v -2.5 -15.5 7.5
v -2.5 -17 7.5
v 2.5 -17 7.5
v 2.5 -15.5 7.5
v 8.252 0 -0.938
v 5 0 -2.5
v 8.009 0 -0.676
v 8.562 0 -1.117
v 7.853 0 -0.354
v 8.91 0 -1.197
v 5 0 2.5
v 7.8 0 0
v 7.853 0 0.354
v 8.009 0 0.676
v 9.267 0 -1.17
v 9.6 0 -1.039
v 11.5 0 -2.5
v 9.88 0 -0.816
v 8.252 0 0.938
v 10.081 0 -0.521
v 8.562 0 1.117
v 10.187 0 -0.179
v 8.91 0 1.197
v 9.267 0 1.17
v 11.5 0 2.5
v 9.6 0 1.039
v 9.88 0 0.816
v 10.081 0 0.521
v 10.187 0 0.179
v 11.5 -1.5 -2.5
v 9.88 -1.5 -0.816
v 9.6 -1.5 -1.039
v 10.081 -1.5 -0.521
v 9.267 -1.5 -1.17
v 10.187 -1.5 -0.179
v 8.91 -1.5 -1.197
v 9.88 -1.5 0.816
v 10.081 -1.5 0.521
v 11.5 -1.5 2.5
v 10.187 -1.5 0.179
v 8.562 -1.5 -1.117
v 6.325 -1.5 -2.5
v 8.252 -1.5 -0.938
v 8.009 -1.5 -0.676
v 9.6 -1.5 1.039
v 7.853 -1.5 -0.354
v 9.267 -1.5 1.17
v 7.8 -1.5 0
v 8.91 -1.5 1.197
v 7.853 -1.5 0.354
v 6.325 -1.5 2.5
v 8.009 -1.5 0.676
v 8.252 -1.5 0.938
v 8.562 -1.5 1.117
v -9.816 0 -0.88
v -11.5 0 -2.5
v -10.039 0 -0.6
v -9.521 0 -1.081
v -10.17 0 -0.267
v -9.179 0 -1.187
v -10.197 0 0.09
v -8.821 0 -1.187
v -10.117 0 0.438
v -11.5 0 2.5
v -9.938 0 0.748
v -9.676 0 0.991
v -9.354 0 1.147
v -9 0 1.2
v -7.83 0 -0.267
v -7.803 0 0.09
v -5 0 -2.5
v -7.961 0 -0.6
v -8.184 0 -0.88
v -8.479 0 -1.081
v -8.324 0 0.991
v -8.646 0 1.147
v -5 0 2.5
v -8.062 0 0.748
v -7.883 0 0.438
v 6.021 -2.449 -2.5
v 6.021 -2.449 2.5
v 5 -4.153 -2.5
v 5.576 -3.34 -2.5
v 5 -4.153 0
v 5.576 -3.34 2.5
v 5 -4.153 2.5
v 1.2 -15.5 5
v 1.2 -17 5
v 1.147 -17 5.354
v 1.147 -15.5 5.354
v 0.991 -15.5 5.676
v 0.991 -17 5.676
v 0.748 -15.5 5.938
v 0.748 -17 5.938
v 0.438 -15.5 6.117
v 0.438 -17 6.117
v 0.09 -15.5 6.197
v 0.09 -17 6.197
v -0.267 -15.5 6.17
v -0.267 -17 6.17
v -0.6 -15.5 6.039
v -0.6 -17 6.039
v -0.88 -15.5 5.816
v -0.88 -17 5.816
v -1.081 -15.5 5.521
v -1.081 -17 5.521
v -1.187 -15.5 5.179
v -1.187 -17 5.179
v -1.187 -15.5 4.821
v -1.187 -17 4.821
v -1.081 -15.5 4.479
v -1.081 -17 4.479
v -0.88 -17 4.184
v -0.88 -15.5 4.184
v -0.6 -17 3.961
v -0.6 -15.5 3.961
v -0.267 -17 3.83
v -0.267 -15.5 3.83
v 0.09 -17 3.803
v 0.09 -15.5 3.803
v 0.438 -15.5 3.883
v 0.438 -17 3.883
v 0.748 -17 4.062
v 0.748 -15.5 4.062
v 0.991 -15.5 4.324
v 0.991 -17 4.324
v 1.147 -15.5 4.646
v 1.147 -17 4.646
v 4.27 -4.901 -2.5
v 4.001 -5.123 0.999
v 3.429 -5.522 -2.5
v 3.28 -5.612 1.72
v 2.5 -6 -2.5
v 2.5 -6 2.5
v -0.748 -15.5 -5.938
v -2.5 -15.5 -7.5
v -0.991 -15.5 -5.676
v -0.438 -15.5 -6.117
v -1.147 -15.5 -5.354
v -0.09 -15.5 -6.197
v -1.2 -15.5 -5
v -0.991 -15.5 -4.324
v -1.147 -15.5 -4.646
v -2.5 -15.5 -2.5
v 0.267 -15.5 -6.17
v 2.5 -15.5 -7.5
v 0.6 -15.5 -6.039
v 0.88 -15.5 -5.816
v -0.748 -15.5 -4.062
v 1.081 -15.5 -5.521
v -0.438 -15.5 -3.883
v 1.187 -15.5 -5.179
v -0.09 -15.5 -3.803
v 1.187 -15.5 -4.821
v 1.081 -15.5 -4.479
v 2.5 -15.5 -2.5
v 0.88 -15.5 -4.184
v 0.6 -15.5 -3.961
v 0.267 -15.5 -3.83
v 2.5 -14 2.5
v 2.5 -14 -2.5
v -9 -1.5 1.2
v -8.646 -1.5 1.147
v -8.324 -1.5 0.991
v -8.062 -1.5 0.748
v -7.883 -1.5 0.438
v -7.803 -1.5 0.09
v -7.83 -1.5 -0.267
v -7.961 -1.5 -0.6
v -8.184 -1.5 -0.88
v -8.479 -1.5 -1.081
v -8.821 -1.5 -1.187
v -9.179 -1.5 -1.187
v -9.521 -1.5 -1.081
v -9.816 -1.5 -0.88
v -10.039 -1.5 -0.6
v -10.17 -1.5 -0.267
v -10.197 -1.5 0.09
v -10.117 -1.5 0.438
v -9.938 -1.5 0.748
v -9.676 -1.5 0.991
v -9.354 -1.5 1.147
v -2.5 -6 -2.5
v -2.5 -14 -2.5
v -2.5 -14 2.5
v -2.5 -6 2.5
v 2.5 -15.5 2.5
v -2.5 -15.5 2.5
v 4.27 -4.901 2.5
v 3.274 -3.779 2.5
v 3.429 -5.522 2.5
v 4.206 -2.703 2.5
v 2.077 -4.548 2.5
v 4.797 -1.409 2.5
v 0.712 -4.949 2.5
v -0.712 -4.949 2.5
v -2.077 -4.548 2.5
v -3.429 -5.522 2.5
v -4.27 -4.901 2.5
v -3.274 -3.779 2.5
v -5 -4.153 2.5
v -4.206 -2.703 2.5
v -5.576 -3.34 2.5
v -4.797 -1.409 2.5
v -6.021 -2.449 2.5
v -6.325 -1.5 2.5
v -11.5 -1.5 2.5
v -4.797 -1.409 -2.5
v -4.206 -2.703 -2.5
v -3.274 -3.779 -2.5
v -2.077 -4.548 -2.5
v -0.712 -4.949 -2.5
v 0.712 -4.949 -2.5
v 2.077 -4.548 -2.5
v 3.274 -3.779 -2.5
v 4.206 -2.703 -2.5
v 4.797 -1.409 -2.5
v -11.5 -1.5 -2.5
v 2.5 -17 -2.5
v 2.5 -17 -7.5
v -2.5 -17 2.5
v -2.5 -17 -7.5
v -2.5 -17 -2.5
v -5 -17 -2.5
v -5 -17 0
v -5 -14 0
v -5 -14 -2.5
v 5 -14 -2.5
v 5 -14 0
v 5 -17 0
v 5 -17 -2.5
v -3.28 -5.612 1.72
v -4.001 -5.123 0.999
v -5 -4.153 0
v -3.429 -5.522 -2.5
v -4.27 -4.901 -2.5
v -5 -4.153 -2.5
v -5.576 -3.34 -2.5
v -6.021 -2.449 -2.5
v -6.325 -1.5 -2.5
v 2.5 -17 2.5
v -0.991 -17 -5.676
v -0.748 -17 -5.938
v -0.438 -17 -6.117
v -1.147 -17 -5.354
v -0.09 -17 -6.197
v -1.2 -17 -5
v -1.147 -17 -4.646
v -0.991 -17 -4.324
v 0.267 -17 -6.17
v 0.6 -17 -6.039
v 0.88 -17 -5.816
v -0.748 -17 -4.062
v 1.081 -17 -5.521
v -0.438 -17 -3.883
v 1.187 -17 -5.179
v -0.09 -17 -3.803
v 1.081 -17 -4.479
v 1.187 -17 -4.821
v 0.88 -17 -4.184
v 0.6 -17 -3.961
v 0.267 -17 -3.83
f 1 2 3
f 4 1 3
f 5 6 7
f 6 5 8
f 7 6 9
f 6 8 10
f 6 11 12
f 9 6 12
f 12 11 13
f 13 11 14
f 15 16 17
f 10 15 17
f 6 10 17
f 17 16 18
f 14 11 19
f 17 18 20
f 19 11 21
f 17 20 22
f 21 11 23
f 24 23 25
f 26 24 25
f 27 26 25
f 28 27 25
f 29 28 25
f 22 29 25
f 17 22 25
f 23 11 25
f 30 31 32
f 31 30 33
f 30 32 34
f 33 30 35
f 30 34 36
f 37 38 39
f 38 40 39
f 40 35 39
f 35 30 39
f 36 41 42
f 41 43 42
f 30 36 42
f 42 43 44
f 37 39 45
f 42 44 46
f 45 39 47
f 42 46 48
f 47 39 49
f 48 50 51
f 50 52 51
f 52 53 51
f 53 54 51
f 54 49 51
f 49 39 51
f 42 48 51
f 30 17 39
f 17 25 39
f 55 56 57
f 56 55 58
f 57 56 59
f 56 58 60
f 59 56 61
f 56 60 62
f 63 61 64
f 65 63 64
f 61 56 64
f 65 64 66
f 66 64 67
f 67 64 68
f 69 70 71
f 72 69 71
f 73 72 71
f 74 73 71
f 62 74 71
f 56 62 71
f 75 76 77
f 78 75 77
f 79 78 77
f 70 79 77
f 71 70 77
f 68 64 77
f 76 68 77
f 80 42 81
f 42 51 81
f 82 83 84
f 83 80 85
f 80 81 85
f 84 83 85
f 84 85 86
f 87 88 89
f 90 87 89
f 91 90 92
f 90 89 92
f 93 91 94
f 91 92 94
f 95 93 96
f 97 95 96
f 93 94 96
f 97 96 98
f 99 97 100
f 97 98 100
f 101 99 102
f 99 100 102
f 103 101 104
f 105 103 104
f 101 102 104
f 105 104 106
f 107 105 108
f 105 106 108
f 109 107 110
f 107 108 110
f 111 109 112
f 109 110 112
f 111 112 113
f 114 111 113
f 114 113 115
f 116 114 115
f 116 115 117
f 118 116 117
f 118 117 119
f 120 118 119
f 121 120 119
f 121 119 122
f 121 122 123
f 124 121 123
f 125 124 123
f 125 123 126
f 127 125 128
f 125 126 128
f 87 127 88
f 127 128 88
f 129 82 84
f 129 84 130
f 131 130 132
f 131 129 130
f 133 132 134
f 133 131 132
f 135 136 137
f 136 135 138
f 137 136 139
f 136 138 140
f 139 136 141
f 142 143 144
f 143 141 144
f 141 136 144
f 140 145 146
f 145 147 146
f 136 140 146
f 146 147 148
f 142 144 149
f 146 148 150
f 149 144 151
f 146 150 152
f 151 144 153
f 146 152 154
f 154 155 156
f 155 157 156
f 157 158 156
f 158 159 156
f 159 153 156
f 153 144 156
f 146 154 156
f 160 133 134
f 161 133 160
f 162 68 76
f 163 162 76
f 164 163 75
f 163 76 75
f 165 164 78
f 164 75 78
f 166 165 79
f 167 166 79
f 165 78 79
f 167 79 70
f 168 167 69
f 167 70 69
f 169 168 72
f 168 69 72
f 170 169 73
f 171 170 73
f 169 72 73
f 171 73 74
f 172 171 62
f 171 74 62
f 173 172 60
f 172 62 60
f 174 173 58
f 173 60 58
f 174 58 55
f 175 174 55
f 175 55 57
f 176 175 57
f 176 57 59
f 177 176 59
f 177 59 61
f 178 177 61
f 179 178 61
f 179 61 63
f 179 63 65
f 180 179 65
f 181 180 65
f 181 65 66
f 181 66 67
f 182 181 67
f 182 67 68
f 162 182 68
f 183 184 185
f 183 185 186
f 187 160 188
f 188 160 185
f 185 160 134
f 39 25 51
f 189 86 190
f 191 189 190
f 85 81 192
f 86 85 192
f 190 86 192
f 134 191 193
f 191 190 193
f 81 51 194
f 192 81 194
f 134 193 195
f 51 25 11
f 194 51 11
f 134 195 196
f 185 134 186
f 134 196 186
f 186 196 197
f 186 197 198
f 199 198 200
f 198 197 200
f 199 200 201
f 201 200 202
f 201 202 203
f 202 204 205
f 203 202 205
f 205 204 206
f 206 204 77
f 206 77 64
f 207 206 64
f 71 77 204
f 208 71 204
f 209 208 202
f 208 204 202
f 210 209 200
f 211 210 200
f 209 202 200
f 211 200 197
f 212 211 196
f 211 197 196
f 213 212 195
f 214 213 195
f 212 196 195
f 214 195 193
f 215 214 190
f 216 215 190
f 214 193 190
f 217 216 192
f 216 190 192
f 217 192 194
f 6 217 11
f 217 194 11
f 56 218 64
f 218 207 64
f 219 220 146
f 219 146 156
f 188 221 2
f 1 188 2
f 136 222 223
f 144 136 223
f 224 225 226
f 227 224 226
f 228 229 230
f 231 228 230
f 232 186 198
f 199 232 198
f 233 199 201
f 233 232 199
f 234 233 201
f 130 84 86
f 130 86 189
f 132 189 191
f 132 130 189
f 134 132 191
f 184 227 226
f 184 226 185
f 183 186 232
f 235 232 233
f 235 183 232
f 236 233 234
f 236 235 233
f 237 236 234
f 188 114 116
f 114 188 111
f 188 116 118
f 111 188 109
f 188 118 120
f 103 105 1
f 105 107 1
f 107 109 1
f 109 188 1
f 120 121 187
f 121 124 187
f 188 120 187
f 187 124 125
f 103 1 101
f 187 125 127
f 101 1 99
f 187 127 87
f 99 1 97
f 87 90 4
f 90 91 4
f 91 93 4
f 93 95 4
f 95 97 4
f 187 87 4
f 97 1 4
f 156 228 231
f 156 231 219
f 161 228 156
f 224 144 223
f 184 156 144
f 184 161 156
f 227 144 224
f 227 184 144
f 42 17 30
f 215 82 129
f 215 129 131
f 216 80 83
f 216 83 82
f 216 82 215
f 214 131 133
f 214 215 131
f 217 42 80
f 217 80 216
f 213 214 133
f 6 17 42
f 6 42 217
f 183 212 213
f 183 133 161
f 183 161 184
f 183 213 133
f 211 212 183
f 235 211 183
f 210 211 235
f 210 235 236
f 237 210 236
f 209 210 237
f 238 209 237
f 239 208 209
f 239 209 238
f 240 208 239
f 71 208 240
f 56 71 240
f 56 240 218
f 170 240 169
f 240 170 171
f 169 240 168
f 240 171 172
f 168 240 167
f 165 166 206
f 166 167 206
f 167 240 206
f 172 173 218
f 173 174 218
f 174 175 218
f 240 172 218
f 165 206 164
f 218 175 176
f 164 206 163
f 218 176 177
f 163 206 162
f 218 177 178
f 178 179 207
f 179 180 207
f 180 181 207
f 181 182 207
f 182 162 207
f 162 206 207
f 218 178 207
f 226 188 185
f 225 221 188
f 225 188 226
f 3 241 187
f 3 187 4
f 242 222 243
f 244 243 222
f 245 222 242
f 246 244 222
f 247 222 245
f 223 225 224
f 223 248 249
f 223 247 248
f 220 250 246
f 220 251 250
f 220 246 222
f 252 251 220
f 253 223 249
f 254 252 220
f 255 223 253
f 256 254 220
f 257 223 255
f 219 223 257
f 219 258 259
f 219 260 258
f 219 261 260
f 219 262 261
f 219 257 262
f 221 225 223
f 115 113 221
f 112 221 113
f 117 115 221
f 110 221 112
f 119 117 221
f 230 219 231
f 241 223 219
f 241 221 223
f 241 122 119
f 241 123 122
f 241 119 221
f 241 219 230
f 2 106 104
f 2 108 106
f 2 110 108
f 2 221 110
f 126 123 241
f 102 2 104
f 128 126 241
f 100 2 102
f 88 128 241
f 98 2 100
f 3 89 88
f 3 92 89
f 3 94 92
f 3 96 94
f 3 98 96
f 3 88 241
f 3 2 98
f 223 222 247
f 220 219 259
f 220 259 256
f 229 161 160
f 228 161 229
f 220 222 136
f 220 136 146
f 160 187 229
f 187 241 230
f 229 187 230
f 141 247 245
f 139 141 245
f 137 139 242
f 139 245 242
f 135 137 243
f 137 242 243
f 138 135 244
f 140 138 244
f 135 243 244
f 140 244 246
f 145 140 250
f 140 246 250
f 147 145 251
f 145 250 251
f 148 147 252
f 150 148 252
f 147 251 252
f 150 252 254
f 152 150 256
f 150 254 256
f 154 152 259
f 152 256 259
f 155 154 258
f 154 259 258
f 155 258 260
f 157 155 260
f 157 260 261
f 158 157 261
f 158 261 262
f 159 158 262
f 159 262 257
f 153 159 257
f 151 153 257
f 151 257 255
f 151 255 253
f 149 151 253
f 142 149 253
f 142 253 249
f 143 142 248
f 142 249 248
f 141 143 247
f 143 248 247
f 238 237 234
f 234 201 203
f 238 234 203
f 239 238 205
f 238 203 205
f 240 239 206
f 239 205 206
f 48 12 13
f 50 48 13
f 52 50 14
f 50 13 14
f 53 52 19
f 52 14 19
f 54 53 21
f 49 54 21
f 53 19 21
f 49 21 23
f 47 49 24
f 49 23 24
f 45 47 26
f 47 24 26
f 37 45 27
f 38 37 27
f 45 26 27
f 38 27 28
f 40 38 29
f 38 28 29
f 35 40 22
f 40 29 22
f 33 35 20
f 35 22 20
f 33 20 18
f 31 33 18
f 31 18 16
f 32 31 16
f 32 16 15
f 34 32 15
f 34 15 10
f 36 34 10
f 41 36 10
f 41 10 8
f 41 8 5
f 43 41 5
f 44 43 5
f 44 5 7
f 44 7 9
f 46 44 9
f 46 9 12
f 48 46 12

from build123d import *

# Parameters (mm, degrees)
BOSS_EXTRUDE1_DEPTH     = 2.5
SKETCH2_R               = 1.2
CUT_EXTRUDE1_DEPTH      = 21.676073128
SKETCH3_W               = 5
SKETCH3_H               = 15
SKETCH3_R               = 1.2
BOSS_EXTRUDE2_DEPTH     = 1.5
CUT_EXTRUDE2_REACH      = 23.852
CUT_EXTRUDE2_END_RADIUS = 6.5
CUT_EXTRUDE4_START      = -2.5
CUT_EXTRUDE4_DEPTH      = 5


# Read off the part's stored shape, not the designer's step: Cut-Extrude4
with BuildPart() as part:
    # Sketch1 → Boss-Extrude1 (new, symmetric)
    with BuildSketch(Plane.XY):
        with BuildLine():
            Line((5, 0), (11.5, 0))
            Line((11.5, 0), (11.5, -1.5))
            Line((11.5, -1.5), (6.32455532, -1.5))
            ThreePointArc((6.32455532, -1.5), (5.81561728, -2.903204376), (5, -4.153311931))
            Line((5, -4.153311931), (5, -17))
            Line((5, -17), (-5, -17))
            Line((-5, -17), (-5, -4.153311931))
            ThreePointArc((-5, -4.153311931), (-5.81561728, -2.903204376), (-6.32455532, -1.5))
            Line((-6.32455532, -1.5), (-11.5, -1.5))
            Line((-11.5, -1.5), (-11.5, 0))
            Line((-11.5, 0), (-5, 0))
            ThreePointArc((-5, 0), (0, -5), (5, 0))
        make_face()
    extrude(amount=BOSS_EXTRUDE1_DEPTH, both=True)

    # Sketch2 → Cut-Extrude1 (cut, through all)
    with BuildSketch(Plane(origin=(0, 0, 0), x_dir=(1, 0, 0), z_dir=(0, 1, 0))):
        with Locations(Location((-9, 0, 0), (0, 0, 270))):
            Circle(SKETCH2_R)
        with Locations(Location((9, 0, 0), (0, 0, 180))):
            Circle(SKETCH2_R)
    extrude(amount=-CUT_EXTRUDE1_DEPTH, mode=Mode.SUBTRACT)

    # Sketch3 → Boss-Extrude2 (add)
    with BuildSketch(Plane.XZ.offset(17)):
        Rectangle(SKETCH3_W, SKETCH3_H)
        with Locations((0, 5)):
            Circle(SKETCH3_R, mode=Mode.SUBTRACT)
        with Locations(Location((0, -5, 0), (0, 0, 180))):
            Circle(SKETCH3_R, mode=Mode.SUBTRACT)
    extrude(amount=-BOSS_EXTRUDE2_DEPTH)

    # Cut-Extrude2: up to this cylinder (the profile starts outside it)
    cut_extrude2_end = Plane(origin=(0, 0, 1.666667), z_dir=(0, 0, -1)) * Cylinder(CUT_EXTRUDE2_END_RADIUS, 61.704, mode=Mode.PRIVATE)
    # Sketch4 → Cut-Extrude2 (cut, up to the surface)
    with BuildSketch(Plane.XZ.offset(17), mode=Mode.PRIVATE) as cut_extrude2_sk1:
        Polygon((2.5, 2.5), (5, 0), (5, 2.5), align=None)
    cut_extrude2_tool1 = extrude(cut_extrude2_sk1.sketch, amount=-CUT_EXTRUDE2_REACH, mode=Mode.PRIVATE) - cut_extrude2_end
    add(cut_extrude2_tool1.solids().sort_by_distance((4.166667, -17, 1.666667))[0], mode=Mode.SUBTRACT)
    # Sketch4 → Cut-Extrude2 (cut, up to the surface)
    with BuildSketch(Plane.XZ.offset(17), mode=Mode.PRIVATE) as cut_extrude2_sk2:
        Polygon((-5, 2.5), (-2.5, 2.5), (-5, 0), align=None)
    cut_extrude2_tool2 = extrude(cut_extrude2_sk2.sketch, amount=-CUT_EXTRUDE2_REACH, mode=Mode.PRIVATE) - cut_extrude2_end
    add(cut_extrude2_tool2.solids().sort_by_distance((-4.166667, -17, 1.666667))[0], mode=Mode.SUBTRACT)

    # Cut-Extrude4 outline → Cut-Extrude4 (cut)
    with BuildSketch(Plane.XY.offset(CUT_EXTRUDE4_START)):
        with BuildLine():
            Line((-2.5, -14), (-2.5, -6))
            ThreePointArc((-2.5, -6), (-3.862002616, -5.228282299), (-5, -4.153311931))
            Line((-5, -4.153311931), (-5, -14))
            Line((-5, -14), (-2.5, -14))
        make_face()
        with BuildLine():
            Line((5, -14), (5, -4.153311931))
            ThreePointArc((5, -4.153311931), (3.862002616, -5.228282299), (2.5, -6))
            Line((2.5, -6), (2.5, -14))
            Line((2.5, -14), (5, -14))
        make_face()
    extrude(amount=CUT_EXTRUDE4_DEPTH, mode=Mode.SUBTRACT)


solid = part.part
